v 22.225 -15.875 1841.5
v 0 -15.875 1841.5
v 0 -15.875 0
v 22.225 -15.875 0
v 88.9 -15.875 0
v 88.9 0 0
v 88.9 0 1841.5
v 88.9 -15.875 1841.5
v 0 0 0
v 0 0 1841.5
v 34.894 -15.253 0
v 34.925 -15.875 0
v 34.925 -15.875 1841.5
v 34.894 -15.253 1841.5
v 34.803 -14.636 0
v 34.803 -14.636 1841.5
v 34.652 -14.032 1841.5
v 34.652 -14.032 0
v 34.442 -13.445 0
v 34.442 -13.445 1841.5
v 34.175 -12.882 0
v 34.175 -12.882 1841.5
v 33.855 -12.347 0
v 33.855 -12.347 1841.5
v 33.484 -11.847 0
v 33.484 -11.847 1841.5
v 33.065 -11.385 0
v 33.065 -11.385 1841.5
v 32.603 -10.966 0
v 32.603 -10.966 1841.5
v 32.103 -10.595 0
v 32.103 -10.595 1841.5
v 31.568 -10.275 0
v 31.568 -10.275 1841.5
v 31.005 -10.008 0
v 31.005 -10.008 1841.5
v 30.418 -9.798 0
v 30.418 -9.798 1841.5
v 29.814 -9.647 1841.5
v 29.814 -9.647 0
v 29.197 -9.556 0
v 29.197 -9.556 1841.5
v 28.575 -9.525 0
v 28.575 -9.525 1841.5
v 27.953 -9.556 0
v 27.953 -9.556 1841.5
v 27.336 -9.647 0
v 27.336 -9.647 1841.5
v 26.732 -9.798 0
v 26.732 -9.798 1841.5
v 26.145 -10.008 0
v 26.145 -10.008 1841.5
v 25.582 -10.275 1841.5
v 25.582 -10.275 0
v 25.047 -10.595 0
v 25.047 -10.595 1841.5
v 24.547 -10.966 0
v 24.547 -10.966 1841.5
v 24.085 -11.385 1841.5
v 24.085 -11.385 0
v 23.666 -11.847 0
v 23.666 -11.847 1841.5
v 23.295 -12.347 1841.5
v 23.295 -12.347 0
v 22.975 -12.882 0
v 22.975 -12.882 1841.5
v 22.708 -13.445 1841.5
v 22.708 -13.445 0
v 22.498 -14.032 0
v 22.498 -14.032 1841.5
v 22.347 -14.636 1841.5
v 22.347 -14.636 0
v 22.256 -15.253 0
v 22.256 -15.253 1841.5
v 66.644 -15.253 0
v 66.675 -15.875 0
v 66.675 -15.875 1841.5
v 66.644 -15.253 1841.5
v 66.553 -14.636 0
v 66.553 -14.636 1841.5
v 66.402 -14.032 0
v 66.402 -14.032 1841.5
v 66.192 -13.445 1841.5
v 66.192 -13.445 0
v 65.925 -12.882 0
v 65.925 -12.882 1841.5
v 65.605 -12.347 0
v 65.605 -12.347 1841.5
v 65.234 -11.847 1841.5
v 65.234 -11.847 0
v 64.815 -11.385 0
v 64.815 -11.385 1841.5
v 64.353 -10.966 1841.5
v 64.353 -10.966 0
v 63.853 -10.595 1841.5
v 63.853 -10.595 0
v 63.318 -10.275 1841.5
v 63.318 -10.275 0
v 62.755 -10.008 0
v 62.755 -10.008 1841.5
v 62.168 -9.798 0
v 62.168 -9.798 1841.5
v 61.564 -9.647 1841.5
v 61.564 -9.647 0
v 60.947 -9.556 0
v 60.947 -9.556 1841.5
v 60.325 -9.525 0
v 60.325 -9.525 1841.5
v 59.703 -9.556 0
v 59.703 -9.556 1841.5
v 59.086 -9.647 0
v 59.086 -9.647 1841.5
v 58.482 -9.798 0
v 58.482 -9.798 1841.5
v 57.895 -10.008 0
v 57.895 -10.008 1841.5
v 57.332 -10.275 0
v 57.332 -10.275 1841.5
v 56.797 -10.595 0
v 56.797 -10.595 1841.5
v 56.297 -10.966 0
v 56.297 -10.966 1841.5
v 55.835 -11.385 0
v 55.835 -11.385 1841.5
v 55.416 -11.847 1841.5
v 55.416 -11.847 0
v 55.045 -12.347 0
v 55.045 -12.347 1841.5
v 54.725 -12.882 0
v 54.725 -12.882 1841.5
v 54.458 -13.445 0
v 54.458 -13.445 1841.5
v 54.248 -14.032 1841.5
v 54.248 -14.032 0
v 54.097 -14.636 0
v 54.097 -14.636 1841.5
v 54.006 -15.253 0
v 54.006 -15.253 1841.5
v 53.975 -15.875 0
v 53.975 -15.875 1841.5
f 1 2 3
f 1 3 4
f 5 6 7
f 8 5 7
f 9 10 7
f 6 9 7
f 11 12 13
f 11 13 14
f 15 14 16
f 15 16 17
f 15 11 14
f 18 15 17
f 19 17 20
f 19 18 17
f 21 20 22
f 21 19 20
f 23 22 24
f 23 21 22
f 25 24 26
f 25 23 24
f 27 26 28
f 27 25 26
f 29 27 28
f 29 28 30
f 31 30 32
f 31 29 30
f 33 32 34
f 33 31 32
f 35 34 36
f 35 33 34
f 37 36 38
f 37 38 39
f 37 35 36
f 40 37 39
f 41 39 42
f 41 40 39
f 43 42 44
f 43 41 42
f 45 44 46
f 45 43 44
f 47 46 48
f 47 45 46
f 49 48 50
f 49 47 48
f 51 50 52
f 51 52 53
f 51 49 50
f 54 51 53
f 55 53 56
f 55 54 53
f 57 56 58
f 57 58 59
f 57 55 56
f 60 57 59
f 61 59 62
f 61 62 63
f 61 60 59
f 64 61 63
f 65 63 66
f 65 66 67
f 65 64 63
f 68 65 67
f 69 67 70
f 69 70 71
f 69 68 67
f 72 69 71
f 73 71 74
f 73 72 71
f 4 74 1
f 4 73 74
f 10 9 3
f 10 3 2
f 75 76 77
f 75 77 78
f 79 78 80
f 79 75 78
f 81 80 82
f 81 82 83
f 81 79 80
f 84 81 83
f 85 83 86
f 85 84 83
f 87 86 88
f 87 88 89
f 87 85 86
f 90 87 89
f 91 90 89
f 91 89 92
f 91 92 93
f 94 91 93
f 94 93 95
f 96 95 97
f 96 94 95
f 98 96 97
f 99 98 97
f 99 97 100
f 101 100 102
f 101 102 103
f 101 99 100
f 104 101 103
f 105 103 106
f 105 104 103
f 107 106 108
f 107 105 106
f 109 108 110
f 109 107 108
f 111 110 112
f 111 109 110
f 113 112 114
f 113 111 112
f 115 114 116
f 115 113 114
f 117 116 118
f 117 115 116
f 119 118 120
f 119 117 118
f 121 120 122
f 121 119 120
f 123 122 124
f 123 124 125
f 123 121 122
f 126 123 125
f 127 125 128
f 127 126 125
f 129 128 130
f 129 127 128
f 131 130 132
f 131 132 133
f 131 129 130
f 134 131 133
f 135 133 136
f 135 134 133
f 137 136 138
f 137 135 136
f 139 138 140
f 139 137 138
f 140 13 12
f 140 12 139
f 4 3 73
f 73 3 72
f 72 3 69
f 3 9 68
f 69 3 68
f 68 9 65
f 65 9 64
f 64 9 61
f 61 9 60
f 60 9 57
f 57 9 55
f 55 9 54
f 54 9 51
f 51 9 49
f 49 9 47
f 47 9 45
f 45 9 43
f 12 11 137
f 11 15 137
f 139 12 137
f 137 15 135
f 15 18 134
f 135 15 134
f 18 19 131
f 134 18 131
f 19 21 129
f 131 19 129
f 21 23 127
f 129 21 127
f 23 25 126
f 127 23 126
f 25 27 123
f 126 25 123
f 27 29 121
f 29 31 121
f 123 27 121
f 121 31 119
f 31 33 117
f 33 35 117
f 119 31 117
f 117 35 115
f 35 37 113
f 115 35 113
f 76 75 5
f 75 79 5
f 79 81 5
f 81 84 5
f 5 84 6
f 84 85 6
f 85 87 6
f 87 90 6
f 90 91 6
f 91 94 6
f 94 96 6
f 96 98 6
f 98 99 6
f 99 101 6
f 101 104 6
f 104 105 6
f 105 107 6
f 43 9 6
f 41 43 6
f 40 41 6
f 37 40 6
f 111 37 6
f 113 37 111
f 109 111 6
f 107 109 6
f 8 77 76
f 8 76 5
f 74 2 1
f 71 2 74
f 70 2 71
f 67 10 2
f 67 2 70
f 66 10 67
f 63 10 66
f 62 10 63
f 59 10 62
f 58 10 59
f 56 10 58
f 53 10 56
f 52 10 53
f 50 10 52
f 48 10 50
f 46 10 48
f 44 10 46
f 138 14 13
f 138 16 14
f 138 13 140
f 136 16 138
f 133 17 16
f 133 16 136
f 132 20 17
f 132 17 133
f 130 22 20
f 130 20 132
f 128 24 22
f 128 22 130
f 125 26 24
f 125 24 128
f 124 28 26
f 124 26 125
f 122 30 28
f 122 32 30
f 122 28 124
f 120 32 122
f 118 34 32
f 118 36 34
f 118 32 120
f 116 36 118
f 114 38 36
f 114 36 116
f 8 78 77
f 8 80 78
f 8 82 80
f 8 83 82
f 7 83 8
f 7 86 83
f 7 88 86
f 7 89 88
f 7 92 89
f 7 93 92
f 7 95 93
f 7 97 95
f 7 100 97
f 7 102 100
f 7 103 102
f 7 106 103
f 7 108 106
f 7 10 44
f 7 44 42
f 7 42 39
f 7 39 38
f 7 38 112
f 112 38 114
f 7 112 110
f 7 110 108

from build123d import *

# Parameters (mm, degrees)
F0_W     = 88.9
F0_H     = 1841.5
F1_DEPTH = 15.875
F3_DEPTH = 1841.5


# Not quite as in the source:
# - a length typed as a fraction of an inch, garbled in the dataset ("3 / 203.2 mm" for 3/8 in), is restored


with BuildPart() as f1:
    # F0 (on Front) → F1 (new body)
    with BuildSketch(Plane.XZ):
        with Locations((44.45, 920.75)):
            Rectangle(F0_W, F0_H)
    extrude(amount=F1_DEPTH)

    # F2 (on Top) → F3 (cut)
    with BuildSketch(Plane.XY):
        with BuildLine():
            Line((22.225, -15.875), (34.925, -15.875))
            ThreePointArc((34.925, -15.875), (28.575, -9.525), (22.225, -15.875))
        make_face()
        with BuildLine():
            Line((53.975, -15.875), (66.675, -15.875))
            ThreePointArc((66.675, -15.875), (60.325, -9.525), (53.975, -15.875))
        make_face()
    extrude(amount=F3_DEPTH, mode=Mode.SUBTRACT)


solid = f1.part
